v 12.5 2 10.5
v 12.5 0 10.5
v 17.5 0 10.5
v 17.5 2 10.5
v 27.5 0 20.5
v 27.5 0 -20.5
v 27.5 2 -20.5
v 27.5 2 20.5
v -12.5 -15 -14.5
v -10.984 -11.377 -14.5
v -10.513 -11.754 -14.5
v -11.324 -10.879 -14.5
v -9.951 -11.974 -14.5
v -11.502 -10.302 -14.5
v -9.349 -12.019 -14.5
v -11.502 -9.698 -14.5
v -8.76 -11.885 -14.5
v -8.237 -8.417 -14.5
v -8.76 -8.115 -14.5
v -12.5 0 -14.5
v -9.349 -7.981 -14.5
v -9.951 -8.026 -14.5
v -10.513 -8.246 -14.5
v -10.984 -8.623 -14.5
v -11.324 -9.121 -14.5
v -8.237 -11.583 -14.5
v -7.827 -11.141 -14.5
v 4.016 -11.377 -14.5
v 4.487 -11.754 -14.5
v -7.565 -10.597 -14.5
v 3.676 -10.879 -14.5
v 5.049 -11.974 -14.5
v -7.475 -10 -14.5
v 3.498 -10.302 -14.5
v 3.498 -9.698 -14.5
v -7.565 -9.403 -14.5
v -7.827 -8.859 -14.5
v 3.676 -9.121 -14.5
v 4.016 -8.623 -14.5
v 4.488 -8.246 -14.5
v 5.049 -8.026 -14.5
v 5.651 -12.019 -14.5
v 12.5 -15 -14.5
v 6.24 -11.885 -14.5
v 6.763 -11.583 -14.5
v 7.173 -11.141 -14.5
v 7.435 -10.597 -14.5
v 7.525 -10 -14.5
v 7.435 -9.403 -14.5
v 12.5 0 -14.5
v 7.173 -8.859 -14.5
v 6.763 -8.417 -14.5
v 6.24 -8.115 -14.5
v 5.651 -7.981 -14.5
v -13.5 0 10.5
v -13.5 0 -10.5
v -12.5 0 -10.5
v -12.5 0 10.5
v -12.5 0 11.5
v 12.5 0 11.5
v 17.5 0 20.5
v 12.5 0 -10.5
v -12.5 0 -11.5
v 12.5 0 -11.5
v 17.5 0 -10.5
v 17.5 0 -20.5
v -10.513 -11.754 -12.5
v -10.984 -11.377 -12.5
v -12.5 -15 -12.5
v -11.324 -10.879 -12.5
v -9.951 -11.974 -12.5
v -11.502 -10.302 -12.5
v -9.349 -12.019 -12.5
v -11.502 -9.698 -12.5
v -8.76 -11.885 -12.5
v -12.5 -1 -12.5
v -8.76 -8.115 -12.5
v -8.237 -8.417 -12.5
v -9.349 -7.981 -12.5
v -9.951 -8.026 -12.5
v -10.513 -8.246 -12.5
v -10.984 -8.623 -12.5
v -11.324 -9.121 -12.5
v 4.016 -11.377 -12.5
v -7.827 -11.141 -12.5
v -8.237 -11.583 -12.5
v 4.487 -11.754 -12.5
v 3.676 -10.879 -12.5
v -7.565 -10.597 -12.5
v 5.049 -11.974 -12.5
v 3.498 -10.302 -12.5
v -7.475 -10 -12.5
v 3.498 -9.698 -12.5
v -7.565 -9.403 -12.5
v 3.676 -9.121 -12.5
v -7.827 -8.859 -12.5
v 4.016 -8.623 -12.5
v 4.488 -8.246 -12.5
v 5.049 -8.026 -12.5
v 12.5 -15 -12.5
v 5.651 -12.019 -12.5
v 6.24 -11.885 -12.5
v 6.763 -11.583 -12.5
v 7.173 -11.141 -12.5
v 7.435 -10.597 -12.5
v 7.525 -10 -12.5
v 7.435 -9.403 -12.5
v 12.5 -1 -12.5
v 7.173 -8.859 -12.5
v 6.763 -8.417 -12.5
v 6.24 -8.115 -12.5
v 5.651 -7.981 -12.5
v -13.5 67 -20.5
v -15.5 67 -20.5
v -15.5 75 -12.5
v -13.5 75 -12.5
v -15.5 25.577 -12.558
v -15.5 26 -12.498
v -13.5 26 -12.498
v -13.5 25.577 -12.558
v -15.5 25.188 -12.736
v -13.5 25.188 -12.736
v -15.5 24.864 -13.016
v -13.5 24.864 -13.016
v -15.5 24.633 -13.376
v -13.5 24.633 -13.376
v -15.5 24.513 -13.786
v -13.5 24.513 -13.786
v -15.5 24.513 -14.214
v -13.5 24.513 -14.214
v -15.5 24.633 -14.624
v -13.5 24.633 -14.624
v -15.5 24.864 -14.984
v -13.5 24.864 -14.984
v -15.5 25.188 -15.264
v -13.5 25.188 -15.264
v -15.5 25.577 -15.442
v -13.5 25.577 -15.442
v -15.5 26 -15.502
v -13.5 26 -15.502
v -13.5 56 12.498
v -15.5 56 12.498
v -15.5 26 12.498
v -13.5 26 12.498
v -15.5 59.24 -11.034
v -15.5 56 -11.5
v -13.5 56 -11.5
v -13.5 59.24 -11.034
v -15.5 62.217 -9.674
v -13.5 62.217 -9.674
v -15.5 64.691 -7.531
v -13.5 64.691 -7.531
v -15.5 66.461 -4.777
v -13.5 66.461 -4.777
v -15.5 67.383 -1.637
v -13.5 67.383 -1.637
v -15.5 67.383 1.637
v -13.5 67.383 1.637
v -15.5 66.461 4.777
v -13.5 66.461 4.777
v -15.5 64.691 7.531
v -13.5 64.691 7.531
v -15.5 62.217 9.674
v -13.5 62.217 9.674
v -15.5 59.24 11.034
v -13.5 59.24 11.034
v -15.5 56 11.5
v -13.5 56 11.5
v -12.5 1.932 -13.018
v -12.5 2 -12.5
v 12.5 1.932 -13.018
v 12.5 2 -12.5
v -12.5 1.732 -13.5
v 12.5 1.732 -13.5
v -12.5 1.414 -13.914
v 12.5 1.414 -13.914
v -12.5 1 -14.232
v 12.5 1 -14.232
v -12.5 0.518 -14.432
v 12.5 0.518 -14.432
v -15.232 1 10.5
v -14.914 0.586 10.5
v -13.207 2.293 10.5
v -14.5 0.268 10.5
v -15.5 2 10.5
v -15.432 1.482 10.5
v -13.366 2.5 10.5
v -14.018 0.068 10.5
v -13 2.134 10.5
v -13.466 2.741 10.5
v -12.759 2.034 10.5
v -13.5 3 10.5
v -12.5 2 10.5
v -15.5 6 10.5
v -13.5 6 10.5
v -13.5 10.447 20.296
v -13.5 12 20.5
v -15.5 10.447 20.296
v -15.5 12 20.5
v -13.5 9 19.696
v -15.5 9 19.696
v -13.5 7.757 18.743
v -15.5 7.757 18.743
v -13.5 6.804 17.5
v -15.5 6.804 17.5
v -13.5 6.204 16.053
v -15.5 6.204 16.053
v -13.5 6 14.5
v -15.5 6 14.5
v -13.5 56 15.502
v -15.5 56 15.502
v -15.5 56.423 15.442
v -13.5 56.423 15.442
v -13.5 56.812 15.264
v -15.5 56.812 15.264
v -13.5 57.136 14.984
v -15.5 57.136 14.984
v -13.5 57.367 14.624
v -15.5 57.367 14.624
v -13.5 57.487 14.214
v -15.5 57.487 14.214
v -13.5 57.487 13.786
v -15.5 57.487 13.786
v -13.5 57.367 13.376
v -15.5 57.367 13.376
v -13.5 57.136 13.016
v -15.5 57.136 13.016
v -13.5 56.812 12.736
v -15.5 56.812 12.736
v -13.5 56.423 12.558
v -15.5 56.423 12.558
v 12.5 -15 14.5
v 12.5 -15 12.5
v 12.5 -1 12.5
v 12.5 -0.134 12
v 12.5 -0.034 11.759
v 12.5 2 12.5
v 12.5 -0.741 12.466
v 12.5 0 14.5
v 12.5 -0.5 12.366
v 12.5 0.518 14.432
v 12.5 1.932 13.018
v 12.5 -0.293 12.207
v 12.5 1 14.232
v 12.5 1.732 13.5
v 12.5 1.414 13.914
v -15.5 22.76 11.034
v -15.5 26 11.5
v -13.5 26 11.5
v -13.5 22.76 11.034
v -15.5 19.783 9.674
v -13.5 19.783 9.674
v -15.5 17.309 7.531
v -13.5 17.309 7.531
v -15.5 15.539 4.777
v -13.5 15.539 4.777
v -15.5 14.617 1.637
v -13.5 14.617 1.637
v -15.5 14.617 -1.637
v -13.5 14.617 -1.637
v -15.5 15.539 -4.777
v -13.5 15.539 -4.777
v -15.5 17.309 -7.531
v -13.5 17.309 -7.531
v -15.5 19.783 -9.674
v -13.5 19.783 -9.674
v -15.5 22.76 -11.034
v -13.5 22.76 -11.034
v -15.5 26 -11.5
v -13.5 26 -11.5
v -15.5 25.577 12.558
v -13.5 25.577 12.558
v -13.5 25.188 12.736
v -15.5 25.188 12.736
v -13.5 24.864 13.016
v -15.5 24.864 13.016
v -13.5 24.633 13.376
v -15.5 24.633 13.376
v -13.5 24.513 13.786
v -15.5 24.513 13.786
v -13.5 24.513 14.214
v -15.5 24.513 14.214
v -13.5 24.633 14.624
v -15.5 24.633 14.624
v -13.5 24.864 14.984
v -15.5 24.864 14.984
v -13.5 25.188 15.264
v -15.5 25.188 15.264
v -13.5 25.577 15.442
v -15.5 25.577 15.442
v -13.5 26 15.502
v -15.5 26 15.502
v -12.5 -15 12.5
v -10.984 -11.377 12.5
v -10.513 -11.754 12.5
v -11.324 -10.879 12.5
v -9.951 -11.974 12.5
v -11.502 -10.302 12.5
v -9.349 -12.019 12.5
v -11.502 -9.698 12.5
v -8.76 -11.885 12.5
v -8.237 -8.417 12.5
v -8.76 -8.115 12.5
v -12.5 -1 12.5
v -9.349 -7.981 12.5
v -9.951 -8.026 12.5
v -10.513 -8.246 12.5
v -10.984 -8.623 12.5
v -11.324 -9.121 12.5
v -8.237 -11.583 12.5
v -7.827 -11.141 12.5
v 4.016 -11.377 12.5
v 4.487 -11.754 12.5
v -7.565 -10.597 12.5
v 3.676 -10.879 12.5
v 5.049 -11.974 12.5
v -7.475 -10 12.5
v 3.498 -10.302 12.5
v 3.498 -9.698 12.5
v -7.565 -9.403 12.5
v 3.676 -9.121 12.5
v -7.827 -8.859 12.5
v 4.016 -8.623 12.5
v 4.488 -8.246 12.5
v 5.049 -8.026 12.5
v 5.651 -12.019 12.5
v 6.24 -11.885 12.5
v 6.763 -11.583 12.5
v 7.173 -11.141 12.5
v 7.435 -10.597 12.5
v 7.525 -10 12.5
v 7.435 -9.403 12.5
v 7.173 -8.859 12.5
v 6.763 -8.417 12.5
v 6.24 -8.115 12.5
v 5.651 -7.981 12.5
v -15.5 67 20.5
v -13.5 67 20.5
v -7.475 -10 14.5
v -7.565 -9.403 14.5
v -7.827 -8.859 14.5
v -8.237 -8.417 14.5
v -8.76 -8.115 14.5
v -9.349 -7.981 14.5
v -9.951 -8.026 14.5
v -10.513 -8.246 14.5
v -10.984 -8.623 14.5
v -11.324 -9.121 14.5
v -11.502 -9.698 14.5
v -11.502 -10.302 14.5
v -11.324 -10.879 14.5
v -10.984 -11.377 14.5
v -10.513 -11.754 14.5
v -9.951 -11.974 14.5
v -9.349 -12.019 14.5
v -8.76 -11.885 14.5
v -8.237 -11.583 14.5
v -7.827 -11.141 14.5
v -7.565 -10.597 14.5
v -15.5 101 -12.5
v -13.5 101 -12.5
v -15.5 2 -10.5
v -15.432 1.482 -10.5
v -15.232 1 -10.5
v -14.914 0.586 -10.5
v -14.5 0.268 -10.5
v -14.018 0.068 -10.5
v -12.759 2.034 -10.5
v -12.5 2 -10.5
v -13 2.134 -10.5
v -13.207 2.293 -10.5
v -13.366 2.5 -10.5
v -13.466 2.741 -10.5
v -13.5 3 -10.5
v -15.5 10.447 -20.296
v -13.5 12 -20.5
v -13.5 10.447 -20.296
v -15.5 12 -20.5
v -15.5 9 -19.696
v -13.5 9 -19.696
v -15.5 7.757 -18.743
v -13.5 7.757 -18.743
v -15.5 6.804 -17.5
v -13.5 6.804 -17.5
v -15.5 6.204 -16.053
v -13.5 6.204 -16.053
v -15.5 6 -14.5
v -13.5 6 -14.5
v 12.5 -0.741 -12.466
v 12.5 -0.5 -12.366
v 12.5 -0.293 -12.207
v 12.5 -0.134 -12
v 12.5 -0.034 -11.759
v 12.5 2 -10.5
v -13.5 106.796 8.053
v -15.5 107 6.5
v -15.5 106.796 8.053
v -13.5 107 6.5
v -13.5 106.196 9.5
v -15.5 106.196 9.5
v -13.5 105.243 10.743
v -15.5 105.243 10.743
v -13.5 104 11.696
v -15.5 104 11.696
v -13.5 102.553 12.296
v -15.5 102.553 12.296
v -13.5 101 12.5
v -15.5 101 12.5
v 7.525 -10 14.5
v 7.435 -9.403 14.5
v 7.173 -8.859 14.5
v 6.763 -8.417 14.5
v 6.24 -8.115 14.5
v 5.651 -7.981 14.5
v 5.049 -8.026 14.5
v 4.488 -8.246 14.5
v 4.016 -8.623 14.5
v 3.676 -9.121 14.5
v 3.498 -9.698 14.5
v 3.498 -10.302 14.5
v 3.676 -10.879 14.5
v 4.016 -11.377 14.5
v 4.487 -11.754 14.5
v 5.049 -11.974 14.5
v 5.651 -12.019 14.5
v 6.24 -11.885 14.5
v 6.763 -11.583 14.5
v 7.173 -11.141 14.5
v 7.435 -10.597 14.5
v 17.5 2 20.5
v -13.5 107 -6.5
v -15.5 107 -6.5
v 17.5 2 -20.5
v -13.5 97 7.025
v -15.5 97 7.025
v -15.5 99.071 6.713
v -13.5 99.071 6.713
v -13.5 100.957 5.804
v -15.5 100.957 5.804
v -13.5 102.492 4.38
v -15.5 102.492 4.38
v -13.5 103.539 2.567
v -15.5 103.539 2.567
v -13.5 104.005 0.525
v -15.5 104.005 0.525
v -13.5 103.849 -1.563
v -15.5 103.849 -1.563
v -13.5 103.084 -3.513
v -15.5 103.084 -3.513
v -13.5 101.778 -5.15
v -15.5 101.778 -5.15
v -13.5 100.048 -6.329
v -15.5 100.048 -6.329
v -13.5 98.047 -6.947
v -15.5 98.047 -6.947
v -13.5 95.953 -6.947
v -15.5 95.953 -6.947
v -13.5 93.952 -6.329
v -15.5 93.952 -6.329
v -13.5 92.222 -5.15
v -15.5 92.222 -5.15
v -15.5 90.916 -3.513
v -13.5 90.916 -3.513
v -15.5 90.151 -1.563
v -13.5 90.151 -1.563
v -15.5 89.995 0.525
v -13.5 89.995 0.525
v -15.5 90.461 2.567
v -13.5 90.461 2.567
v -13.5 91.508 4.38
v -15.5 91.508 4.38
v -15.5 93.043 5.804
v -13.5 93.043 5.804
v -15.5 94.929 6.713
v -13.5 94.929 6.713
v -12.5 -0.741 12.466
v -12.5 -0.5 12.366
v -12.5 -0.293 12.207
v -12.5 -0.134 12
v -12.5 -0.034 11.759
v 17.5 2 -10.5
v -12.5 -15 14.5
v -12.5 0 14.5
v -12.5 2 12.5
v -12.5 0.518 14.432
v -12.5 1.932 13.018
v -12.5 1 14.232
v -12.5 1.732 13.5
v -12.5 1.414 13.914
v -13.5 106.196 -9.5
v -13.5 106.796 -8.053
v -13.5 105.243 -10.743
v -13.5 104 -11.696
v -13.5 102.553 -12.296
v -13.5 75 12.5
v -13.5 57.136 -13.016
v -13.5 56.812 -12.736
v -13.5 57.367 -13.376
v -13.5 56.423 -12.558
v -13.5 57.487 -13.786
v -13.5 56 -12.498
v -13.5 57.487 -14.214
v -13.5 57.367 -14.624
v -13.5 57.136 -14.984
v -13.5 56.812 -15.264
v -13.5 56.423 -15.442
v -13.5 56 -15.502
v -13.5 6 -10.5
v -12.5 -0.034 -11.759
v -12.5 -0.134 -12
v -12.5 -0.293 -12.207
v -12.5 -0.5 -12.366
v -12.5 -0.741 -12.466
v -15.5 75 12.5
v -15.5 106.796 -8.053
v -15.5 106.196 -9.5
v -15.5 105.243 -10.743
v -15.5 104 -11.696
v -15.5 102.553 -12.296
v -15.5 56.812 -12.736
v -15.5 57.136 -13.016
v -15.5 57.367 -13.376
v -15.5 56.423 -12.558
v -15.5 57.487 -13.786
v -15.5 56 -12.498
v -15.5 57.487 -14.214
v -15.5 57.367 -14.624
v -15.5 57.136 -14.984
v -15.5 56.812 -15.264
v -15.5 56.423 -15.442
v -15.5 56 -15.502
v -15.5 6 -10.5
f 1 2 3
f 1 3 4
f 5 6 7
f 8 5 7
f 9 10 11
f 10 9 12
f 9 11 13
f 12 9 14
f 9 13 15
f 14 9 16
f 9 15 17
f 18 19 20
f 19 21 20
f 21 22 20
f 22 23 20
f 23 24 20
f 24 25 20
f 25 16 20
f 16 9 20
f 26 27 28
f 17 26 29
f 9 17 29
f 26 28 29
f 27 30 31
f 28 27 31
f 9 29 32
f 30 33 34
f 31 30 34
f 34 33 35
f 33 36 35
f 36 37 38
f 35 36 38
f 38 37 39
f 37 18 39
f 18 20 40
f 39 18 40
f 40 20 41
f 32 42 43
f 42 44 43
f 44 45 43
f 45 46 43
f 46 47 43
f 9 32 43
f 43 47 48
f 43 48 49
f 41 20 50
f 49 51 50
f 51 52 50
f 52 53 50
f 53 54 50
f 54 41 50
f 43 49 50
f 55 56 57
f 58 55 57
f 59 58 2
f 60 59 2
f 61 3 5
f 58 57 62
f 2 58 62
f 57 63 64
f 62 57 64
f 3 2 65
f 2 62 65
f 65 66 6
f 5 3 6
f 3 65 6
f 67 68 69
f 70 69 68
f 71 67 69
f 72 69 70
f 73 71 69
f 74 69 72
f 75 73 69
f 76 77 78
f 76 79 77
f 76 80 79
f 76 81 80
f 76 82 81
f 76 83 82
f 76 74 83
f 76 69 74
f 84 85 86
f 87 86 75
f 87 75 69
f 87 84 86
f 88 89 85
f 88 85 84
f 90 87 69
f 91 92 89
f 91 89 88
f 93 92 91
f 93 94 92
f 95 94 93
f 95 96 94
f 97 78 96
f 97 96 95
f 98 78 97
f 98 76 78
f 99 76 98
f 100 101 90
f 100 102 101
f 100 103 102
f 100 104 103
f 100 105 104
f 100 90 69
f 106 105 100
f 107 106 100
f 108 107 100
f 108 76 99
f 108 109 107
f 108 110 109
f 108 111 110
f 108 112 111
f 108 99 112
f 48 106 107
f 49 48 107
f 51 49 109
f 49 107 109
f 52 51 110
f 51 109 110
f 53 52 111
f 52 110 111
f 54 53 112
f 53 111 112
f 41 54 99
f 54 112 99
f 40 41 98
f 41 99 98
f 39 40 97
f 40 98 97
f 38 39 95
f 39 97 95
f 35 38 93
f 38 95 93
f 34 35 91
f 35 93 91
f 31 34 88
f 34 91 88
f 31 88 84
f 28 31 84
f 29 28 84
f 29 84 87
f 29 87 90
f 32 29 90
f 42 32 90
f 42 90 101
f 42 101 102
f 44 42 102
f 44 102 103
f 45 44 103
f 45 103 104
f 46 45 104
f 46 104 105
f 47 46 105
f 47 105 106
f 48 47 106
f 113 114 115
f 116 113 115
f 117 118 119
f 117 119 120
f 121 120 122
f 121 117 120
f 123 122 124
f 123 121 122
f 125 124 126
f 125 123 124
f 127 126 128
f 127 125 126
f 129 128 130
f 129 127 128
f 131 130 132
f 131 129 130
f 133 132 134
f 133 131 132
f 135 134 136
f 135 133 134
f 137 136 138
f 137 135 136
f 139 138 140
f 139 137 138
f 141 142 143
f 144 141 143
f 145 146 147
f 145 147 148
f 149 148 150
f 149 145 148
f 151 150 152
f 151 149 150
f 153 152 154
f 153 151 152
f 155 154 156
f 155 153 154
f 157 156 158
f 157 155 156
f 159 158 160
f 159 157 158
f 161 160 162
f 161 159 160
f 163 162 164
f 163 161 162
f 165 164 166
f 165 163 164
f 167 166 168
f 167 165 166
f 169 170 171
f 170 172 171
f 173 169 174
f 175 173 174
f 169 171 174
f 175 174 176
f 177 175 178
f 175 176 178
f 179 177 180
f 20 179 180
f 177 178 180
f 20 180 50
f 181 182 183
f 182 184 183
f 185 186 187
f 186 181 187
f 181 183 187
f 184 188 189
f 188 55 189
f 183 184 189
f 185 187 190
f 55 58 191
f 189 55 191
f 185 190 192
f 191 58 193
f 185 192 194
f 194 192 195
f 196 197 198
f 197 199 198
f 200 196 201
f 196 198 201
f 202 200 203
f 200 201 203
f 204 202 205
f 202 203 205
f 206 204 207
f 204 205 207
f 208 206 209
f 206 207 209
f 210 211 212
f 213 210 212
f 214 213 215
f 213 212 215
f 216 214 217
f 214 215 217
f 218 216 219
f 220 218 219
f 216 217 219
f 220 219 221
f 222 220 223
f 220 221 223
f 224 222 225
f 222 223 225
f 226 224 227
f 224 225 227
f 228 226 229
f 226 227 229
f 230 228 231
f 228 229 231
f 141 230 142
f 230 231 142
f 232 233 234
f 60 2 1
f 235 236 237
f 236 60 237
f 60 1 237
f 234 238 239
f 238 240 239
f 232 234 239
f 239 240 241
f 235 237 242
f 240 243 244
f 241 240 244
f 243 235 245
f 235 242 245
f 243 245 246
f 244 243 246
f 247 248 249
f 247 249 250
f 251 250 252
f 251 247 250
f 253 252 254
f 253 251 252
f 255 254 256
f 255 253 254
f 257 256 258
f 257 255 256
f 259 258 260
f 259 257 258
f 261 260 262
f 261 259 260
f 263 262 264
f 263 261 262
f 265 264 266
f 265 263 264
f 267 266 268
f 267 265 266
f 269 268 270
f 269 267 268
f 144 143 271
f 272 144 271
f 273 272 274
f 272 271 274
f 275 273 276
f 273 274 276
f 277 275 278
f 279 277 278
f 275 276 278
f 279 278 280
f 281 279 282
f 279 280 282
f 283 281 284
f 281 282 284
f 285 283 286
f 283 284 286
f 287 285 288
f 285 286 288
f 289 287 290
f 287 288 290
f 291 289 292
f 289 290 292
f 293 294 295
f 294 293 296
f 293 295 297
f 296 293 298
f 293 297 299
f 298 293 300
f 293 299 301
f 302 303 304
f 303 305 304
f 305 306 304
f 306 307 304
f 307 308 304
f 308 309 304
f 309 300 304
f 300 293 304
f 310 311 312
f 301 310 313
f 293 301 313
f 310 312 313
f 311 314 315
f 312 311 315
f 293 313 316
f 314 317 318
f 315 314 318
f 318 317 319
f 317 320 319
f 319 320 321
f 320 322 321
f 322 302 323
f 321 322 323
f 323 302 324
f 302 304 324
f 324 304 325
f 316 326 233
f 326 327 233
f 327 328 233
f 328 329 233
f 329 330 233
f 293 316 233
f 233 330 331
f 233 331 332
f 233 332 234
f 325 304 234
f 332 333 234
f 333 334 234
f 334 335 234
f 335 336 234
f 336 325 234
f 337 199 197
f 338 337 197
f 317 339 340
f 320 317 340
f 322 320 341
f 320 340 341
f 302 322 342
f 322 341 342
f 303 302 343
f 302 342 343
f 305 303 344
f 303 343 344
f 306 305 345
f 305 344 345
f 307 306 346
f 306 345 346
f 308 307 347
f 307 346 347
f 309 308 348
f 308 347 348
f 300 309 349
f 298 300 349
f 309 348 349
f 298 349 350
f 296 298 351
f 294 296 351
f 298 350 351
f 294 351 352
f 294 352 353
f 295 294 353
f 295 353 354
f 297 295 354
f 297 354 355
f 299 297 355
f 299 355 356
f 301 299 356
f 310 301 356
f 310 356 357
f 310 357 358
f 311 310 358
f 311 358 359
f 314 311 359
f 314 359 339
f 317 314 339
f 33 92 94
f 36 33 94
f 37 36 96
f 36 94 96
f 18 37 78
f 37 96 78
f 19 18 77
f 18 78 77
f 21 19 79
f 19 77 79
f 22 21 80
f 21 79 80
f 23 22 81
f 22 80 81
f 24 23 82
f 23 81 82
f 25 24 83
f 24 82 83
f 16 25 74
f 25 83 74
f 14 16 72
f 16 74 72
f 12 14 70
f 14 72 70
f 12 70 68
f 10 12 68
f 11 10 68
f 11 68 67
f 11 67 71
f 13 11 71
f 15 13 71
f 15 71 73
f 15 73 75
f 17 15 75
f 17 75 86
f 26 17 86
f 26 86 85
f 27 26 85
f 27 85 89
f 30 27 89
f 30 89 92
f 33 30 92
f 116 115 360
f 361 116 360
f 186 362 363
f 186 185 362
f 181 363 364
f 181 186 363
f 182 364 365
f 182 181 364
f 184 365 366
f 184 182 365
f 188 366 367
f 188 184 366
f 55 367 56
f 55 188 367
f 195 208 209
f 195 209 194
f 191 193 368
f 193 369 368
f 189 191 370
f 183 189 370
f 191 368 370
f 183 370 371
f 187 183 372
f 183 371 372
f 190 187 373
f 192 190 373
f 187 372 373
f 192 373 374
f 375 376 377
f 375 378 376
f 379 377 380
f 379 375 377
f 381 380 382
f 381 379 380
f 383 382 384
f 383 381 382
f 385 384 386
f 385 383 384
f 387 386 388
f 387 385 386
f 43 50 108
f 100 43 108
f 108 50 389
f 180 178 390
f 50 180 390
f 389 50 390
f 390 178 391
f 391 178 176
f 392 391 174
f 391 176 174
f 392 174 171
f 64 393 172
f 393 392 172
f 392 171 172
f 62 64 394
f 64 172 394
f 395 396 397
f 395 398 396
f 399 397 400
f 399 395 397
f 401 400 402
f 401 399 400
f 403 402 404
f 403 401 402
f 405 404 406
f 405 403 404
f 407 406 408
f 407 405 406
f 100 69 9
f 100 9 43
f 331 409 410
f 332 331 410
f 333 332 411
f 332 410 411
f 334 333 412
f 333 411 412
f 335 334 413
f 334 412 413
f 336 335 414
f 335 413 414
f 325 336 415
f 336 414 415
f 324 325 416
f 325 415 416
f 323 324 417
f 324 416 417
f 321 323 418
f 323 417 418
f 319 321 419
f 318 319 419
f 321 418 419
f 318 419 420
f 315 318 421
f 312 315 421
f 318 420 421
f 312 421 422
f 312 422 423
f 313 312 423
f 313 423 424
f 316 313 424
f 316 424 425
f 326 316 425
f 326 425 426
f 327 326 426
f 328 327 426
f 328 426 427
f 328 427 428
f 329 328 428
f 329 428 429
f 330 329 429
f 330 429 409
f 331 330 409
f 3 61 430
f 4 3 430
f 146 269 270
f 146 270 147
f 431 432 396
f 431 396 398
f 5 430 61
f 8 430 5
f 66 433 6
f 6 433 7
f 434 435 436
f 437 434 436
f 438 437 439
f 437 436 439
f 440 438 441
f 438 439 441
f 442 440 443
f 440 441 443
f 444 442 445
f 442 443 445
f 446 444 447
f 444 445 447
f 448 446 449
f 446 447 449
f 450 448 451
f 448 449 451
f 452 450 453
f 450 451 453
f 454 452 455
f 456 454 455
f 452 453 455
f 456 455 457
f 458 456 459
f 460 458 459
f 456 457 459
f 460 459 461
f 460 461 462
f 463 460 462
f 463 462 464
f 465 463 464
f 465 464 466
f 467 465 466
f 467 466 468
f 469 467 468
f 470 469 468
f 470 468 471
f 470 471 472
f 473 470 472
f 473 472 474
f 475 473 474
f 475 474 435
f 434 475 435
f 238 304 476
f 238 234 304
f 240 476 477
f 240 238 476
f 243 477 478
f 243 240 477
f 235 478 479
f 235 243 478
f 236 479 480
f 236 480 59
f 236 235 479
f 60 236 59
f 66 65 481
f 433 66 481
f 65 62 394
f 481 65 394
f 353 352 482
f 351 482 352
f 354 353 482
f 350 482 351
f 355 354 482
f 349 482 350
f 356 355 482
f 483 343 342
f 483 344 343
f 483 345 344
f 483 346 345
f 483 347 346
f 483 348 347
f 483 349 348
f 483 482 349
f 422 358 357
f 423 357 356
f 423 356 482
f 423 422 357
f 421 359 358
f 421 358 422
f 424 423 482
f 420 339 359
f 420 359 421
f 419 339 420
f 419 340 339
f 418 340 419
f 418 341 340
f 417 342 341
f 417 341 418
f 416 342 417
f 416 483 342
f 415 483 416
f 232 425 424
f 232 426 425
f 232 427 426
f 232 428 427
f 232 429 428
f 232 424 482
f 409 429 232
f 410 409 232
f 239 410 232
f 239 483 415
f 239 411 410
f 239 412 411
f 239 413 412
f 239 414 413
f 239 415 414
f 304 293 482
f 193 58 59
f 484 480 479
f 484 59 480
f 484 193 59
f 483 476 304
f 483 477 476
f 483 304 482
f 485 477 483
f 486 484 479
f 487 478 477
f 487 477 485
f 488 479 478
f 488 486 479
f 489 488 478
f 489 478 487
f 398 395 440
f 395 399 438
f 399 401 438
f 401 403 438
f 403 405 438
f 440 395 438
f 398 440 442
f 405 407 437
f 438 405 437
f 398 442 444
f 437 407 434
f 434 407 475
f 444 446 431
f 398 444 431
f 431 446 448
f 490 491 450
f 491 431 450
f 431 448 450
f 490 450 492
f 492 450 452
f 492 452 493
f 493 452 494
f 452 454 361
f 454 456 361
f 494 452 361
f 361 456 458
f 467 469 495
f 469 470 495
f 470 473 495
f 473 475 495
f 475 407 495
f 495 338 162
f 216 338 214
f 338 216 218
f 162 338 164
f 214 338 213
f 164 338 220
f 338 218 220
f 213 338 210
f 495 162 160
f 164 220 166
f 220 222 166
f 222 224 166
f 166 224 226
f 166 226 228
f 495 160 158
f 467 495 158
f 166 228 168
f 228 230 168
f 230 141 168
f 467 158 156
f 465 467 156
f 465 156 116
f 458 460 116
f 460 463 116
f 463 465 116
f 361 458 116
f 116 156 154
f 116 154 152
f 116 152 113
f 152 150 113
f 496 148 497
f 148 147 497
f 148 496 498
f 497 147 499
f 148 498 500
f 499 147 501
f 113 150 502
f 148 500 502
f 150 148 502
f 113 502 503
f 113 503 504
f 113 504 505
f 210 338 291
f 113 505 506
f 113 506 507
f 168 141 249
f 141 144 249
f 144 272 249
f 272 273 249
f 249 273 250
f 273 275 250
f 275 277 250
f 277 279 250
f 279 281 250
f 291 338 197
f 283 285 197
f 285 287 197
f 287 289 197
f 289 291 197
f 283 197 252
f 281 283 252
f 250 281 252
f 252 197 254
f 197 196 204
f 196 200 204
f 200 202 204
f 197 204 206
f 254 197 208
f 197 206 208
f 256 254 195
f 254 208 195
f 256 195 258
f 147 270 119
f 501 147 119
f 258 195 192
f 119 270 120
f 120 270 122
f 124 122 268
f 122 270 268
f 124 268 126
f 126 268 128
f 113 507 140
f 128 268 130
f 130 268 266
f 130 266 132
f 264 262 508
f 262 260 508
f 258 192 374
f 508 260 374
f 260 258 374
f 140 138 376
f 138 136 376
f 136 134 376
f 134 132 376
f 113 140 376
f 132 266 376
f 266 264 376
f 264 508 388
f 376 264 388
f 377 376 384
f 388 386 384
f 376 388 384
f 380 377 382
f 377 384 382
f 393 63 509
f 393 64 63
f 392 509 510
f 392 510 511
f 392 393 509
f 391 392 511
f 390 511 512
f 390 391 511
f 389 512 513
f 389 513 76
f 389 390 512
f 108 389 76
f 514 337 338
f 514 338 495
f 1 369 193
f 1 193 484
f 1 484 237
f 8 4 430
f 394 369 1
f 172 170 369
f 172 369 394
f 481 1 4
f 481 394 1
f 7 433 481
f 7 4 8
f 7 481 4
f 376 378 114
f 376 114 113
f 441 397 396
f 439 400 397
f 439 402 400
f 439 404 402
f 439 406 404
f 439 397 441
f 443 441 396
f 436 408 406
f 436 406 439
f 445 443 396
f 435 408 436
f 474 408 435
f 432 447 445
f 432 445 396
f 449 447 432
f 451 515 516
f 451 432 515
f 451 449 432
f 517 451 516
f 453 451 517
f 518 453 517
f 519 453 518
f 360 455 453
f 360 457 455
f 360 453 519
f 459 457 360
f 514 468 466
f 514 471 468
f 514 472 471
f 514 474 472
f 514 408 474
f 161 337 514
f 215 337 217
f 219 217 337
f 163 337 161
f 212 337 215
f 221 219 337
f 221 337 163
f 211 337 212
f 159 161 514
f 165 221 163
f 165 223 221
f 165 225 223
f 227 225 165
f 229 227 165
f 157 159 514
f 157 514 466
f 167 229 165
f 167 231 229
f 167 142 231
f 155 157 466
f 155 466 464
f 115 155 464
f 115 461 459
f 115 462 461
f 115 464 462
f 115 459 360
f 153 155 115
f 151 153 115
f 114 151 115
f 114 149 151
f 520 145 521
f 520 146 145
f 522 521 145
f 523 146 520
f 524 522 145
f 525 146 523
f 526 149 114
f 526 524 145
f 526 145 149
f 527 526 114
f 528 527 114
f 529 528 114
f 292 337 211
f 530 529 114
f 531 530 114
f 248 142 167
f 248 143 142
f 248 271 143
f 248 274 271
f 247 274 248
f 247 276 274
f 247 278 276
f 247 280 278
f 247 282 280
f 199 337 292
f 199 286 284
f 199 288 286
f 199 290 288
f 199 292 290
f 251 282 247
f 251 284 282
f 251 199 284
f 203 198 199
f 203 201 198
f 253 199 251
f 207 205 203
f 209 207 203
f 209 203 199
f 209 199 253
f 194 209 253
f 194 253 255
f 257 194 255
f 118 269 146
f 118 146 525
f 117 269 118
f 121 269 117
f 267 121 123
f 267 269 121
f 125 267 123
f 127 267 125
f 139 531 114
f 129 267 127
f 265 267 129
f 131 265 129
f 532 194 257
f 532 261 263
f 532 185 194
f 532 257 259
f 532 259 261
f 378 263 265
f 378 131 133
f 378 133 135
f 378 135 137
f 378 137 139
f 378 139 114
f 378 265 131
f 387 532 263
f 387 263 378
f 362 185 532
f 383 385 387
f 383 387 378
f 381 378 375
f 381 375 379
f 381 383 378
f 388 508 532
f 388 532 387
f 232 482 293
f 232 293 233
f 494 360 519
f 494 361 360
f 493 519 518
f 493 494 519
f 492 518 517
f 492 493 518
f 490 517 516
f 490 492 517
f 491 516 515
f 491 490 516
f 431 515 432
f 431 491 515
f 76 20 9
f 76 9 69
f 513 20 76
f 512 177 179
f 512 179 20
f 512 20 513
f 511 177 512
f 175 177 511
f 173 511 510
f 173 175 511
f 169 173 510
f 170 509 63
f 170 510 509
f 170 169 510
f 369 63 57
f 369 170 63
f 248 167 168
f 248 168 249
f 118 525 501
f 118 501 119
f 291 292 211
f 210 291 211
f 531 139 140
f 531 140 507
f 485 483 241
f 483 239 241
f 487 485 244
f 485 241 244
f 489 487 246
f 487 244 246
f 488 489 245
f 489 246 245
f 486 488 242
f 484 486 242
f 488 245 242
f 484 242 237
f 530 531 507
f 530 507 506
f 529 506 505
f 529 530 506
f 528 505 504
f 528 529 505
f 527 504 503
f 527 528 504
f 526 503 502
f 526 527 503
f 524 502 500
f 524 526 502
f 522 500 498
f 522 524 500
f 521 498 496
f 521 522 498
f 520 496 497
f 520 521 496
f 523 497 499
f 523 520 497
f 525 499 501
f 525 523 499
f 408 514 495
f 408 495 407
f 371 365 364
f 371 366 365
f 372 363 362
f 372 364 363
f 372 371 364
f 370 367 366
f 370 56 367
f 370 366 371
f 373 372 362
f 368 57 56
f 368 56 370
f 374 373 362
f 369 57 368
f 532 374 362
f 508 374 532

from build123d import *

# Parameters (mm, degrees)
SKETCH1_W                = 25
SKETCH1_H                = 25
BOSS_EXTRUDE1_DEPTH      = 2
BOSS_EXTRUDE2_DEPTH      = 15
BOSS_EXTRUDE2_DEPTH_BACK = 2
SKETCH2_W                = 25
SKETCH2_H                = 2
SKETCH3_R                = 2.025
CUT_EXTRUDE1_DEPTH       = 35.960692213
FILLET1_R                = 2
FILLET2_R                = 1
SKETCH4_W                = 21
SKETCH4_H                = 2
BOSS_EXTRUDE3_DEPTH      = 3
SKETCH5_W                = 21
SKETCH5_H                = 2
BOSS_EXTRUDE4_DEPTH      = 15
BOSS_EXTRUDE5_DEPTH      = 15
BOSS_EXTRUDE5_DEPTH_BACK = 36
SKETCH6_W                = 10
SKETCH6_H                = 2
SKETCH7_W                = 2
SKETCH7_H                = 41
BOSS_EXTRUDE6_DEPTH      = 105
SKETCH8_W                = 10
SKETCH8_H                = 4
CUT_EXTRUDE2_DEPTH       = 118.389309564
FILLET3_R                = 1
FILLET4_R                = 2
CUT_EXTRUDE3_DEPTH       = 119.102709537
SKETCH12_R               = 7.025
CUT_EXTRUDE4_DEPTH       = 119.102709537
CUT_EXTRUDE5_DEPTH       = 119.102709537
FILLET7_R                = 6
FILLET8_R                = 6
SKETCH14_W               = 10
SKETCH14_H               = 5
CUT_EXTRUDE6_DEPTH       = 112.496636721


with BuildPart() as part:
    # Sketch1 → Boss-Extrude1 (new body)
    with BuildSketch(Plane(origin=(0, 0, 0), x_dir=(1, 0, 0), z_dir=(0, 1, 0))):
        Rectangle(SKETCH1_W, SKETCH1_H)
    extrude(amount=BOSS_EXTRUDE1_DEPTH)

    # Sketch2 → Boss-Extrude2 (add, two sides: drawn at the far end of the back side and taken through both)
    with BuildSketch(Plane.XZ.offset(-BOSS_EXTRUDE2_DEPTH_BACK)):
        with Locations((0, 13.5)):
            Rectangle(SKETCH2_W, SKETCH2_H)
        with Locations((0, -13.5)):
            Rectangle(SKETCH2_W, SKETCH2_H)
    extrude(amount=BOSS_EXTRUDE2_DEPTH + BOSS_EXTRUDE2_DEPTH_BACK)

    # Sketch3 → Cut-Extrude1 (cut, through all)
    with BuildSketch(Plane.XY.offset(14.5)):
        with Locations((-9.5, -10)):
            Circle(SKETCH3_R)
        with Locations((5.5, -10)):
            Circle(SKETCH3_R)
    extrude(amount=-CUT_EXTRUDE1_DEPTH, mode=Mode.SUBTRACT)

    # Fillet1
    fillet1_edges = [part.edges().sort_by_distance(p)[0] for p in [
        (0, 2, 14.5),
        (0, 2, -14.5),
    ]]
    fillet(fillet1_edges, radius=FILLET1_R)

    # Fillet2
    fillet2_edges = [part.edges().sort_by_distance(p)[0] for p in [
        (0, 0, 12.5),
        (0, 0, -12.5),
    ]]
    fillet(fillet2_edges, radius=FILLET2_R)

    # Sketch4 → Boss-Extrude3 (add)
    with BuildSketch(Plane.ZY.offset(12.5)):
        with Locations((0, 1)):
            Rectangle(SKETCH4_W, SKETCH4_H)
    extrude(amount=BOSS_EXTRUDE3_DEPTH)

    # Sketch5 → Boss-Extrude4 (add)
    with BuildSketch(Plane(origin=(12.5, 0, 0), x_dir=(0, 0, -1), z_dir=(1, 0, 0))):
        with Locations((0, 1)):
            Rectangle(SKETCH5_W, SKETCH5_H)
    extrude(amount=BOSS_EXTRUDE4_DEPTH)

    # Sketch6 → Boss-Extrude5 (add, two sides: drawn at the far end of the back side and taken through both)
    with BuildSketch(Plane.XY.offset(10.5).offset(-BOSS_EXTRUDE5_DEPTH_BACK)):
        with Locations((22.5, 1)):
            Rectangle(SKETCH6_W, SKETCH6_H)
    extrude(amount=BOSS_EXTRUDE5_DEPTH + BOSS_EXTRUDE5_DEPTH_BACK)

    # Sketch7 → Boss-Extrude6 (add)
    with BuildSketch(Plane(origin=(0, 2, 0), x_dir=(1, 0, 0), z_dir=(0, 1, 0))):
        with Locations((-14.5, 0)):
            Rectangle(SKETCH7_W, SKETCH7_H)
    extrude(amount=BOSS_EXTRUDE6_DEPTH)

    # Sketch8 → Cut-Extrude2 (cut, through all)
    with BuildSketch(Plane(origin=(-13.5, 0, 0), x_dir=(0, 0, -1), z_dir=(1, 0, 0))):
        with Locations((-15.5, 4)):
            Rectangle(SKETCH8_W, SKETCH8_H)
        with Locations((15.5, 4)):
            Rectangle(SKETCH8_W, SKETCH8_H)
    extrude(amount=-CUT_EXTRUDE2_DEPTH, mode=Mode.SUBTRACT)

    # Fillet3
    fillet3_edges = [part.edges().sort_by_distance(p)[0] for p in [
        (-13.5, 2, 0),
    ]]
    fillet(fillet3_edges, radius=FILLET3_R)

    # Fillet4
    fillet4_edges = [part.edges().sort_by_distance(p)[0] for p in [
        (-15.5, 0, 0),
    ]]
    fillet(fillet4_edges, radius=FILLET4_R)

    # Sketch10 → Cut-Extrude3 (cut, through all)
    with BuildSketch(Plane.ZY.offset(15.5)):
        with BuildLine():
            Line((11.5, 56), (11.5, 26))
            ThreePointArc((11.5, 26), (0, 14.5), (-11.5, 26))
            Line((-11.5, 26), (-11.5, 56))
            ThreePointArc((-11.5, 56), (0, 67.5), (11.5, 56))
        make_face()
        with BuildLine():
            Line((-12.4975, 56), (-12.4975, 26))
            ThreePointArc((-12.4975, 26), (-14, 24.4975), (-15.5025, 26))
            Line((-15.5025, 26), (-15.5025, 56))
            ThreePointArc((-15.5025, 56), (-14, 57.5025), (-12.4975, 56))
        make_face()
        with BuildLine():
            Line((12.4975, 56), (12.4975, 26))
            ThreePointArc((12.4975, 26), (14, 24.4975), (15.5025, 26))
            Line((15.5025, 26), (15.5025, 56))
            ThreePointArc((15.5025, 56), (14, 57.5025), (12.4975, 56))
        make_face()
    extrude(amount=-CUT_EXTRUDE3_DEPTH, mode=Mode.SUBTRACT)

    # Sketch12 → Cut-Extrude4 (cut, through all)
    with BuildSketch(Plane.ZY.offset(15.5)):
        with Locations((0, 97)):
            Circle(SKETCH12_R)
    extrude(amount=-CUT_EXTRUDE4_DEPTH, mode=Mode.SUBTRACT)

    # Sketch13 → Cut-Extrude5 (cut, through all)
    with BuildSketch(Plane.ZY.offset(15.5)):
        Polygon((-20.5, 107), (-20.5, 67), (-12.5, 75), (-12.5, 107), align=None)
        Polygon((12.5, 75), (12.5, 107), (20.5, 107), (20.5, 67), align=None)
    extrude(amount=-CUT_EXTRUDE5_DEPTH, mode=Mode.SUBTRACT)

    # Fillet7
    fillet7_edges = [part.edges().sort_by_distance(p)[0] for p in [
        (-14.5, 107, 12.5),
        (-14.5, 107, -12.5),
    ]]
    fillet(fillet7_edges, radius=FILLET7_R)

    # Fillet8
    fillet8_edges = [part.edges().sort_by_distance(p)[0] for p in [
        (-14.5, 6, 20.5),
        (-14.5, 6, -20.5),
    ]]
    fillet(fillet8_edges, radius=FILLET8_R)

    # Sketch14 → Cut-Extrude6 (cut, through all)
    with BuildSketch(Plane(origin=(0, 2, 0), x_dir=(1, 0, 0), z_dir=(0, 1, 0))):
        with Locations((22.5, 23)):
            Rectangle(SKETCH14_W, SKETCH14_H)
        with Locations((22.5, -23)):
            Rectangle(SKETCH14_W, SKETCH14_H)
    extrude(amount=-CUT_EXTRUDE6_DEPTH, mode=Mode.SUBTRACT)


solid = part.part
